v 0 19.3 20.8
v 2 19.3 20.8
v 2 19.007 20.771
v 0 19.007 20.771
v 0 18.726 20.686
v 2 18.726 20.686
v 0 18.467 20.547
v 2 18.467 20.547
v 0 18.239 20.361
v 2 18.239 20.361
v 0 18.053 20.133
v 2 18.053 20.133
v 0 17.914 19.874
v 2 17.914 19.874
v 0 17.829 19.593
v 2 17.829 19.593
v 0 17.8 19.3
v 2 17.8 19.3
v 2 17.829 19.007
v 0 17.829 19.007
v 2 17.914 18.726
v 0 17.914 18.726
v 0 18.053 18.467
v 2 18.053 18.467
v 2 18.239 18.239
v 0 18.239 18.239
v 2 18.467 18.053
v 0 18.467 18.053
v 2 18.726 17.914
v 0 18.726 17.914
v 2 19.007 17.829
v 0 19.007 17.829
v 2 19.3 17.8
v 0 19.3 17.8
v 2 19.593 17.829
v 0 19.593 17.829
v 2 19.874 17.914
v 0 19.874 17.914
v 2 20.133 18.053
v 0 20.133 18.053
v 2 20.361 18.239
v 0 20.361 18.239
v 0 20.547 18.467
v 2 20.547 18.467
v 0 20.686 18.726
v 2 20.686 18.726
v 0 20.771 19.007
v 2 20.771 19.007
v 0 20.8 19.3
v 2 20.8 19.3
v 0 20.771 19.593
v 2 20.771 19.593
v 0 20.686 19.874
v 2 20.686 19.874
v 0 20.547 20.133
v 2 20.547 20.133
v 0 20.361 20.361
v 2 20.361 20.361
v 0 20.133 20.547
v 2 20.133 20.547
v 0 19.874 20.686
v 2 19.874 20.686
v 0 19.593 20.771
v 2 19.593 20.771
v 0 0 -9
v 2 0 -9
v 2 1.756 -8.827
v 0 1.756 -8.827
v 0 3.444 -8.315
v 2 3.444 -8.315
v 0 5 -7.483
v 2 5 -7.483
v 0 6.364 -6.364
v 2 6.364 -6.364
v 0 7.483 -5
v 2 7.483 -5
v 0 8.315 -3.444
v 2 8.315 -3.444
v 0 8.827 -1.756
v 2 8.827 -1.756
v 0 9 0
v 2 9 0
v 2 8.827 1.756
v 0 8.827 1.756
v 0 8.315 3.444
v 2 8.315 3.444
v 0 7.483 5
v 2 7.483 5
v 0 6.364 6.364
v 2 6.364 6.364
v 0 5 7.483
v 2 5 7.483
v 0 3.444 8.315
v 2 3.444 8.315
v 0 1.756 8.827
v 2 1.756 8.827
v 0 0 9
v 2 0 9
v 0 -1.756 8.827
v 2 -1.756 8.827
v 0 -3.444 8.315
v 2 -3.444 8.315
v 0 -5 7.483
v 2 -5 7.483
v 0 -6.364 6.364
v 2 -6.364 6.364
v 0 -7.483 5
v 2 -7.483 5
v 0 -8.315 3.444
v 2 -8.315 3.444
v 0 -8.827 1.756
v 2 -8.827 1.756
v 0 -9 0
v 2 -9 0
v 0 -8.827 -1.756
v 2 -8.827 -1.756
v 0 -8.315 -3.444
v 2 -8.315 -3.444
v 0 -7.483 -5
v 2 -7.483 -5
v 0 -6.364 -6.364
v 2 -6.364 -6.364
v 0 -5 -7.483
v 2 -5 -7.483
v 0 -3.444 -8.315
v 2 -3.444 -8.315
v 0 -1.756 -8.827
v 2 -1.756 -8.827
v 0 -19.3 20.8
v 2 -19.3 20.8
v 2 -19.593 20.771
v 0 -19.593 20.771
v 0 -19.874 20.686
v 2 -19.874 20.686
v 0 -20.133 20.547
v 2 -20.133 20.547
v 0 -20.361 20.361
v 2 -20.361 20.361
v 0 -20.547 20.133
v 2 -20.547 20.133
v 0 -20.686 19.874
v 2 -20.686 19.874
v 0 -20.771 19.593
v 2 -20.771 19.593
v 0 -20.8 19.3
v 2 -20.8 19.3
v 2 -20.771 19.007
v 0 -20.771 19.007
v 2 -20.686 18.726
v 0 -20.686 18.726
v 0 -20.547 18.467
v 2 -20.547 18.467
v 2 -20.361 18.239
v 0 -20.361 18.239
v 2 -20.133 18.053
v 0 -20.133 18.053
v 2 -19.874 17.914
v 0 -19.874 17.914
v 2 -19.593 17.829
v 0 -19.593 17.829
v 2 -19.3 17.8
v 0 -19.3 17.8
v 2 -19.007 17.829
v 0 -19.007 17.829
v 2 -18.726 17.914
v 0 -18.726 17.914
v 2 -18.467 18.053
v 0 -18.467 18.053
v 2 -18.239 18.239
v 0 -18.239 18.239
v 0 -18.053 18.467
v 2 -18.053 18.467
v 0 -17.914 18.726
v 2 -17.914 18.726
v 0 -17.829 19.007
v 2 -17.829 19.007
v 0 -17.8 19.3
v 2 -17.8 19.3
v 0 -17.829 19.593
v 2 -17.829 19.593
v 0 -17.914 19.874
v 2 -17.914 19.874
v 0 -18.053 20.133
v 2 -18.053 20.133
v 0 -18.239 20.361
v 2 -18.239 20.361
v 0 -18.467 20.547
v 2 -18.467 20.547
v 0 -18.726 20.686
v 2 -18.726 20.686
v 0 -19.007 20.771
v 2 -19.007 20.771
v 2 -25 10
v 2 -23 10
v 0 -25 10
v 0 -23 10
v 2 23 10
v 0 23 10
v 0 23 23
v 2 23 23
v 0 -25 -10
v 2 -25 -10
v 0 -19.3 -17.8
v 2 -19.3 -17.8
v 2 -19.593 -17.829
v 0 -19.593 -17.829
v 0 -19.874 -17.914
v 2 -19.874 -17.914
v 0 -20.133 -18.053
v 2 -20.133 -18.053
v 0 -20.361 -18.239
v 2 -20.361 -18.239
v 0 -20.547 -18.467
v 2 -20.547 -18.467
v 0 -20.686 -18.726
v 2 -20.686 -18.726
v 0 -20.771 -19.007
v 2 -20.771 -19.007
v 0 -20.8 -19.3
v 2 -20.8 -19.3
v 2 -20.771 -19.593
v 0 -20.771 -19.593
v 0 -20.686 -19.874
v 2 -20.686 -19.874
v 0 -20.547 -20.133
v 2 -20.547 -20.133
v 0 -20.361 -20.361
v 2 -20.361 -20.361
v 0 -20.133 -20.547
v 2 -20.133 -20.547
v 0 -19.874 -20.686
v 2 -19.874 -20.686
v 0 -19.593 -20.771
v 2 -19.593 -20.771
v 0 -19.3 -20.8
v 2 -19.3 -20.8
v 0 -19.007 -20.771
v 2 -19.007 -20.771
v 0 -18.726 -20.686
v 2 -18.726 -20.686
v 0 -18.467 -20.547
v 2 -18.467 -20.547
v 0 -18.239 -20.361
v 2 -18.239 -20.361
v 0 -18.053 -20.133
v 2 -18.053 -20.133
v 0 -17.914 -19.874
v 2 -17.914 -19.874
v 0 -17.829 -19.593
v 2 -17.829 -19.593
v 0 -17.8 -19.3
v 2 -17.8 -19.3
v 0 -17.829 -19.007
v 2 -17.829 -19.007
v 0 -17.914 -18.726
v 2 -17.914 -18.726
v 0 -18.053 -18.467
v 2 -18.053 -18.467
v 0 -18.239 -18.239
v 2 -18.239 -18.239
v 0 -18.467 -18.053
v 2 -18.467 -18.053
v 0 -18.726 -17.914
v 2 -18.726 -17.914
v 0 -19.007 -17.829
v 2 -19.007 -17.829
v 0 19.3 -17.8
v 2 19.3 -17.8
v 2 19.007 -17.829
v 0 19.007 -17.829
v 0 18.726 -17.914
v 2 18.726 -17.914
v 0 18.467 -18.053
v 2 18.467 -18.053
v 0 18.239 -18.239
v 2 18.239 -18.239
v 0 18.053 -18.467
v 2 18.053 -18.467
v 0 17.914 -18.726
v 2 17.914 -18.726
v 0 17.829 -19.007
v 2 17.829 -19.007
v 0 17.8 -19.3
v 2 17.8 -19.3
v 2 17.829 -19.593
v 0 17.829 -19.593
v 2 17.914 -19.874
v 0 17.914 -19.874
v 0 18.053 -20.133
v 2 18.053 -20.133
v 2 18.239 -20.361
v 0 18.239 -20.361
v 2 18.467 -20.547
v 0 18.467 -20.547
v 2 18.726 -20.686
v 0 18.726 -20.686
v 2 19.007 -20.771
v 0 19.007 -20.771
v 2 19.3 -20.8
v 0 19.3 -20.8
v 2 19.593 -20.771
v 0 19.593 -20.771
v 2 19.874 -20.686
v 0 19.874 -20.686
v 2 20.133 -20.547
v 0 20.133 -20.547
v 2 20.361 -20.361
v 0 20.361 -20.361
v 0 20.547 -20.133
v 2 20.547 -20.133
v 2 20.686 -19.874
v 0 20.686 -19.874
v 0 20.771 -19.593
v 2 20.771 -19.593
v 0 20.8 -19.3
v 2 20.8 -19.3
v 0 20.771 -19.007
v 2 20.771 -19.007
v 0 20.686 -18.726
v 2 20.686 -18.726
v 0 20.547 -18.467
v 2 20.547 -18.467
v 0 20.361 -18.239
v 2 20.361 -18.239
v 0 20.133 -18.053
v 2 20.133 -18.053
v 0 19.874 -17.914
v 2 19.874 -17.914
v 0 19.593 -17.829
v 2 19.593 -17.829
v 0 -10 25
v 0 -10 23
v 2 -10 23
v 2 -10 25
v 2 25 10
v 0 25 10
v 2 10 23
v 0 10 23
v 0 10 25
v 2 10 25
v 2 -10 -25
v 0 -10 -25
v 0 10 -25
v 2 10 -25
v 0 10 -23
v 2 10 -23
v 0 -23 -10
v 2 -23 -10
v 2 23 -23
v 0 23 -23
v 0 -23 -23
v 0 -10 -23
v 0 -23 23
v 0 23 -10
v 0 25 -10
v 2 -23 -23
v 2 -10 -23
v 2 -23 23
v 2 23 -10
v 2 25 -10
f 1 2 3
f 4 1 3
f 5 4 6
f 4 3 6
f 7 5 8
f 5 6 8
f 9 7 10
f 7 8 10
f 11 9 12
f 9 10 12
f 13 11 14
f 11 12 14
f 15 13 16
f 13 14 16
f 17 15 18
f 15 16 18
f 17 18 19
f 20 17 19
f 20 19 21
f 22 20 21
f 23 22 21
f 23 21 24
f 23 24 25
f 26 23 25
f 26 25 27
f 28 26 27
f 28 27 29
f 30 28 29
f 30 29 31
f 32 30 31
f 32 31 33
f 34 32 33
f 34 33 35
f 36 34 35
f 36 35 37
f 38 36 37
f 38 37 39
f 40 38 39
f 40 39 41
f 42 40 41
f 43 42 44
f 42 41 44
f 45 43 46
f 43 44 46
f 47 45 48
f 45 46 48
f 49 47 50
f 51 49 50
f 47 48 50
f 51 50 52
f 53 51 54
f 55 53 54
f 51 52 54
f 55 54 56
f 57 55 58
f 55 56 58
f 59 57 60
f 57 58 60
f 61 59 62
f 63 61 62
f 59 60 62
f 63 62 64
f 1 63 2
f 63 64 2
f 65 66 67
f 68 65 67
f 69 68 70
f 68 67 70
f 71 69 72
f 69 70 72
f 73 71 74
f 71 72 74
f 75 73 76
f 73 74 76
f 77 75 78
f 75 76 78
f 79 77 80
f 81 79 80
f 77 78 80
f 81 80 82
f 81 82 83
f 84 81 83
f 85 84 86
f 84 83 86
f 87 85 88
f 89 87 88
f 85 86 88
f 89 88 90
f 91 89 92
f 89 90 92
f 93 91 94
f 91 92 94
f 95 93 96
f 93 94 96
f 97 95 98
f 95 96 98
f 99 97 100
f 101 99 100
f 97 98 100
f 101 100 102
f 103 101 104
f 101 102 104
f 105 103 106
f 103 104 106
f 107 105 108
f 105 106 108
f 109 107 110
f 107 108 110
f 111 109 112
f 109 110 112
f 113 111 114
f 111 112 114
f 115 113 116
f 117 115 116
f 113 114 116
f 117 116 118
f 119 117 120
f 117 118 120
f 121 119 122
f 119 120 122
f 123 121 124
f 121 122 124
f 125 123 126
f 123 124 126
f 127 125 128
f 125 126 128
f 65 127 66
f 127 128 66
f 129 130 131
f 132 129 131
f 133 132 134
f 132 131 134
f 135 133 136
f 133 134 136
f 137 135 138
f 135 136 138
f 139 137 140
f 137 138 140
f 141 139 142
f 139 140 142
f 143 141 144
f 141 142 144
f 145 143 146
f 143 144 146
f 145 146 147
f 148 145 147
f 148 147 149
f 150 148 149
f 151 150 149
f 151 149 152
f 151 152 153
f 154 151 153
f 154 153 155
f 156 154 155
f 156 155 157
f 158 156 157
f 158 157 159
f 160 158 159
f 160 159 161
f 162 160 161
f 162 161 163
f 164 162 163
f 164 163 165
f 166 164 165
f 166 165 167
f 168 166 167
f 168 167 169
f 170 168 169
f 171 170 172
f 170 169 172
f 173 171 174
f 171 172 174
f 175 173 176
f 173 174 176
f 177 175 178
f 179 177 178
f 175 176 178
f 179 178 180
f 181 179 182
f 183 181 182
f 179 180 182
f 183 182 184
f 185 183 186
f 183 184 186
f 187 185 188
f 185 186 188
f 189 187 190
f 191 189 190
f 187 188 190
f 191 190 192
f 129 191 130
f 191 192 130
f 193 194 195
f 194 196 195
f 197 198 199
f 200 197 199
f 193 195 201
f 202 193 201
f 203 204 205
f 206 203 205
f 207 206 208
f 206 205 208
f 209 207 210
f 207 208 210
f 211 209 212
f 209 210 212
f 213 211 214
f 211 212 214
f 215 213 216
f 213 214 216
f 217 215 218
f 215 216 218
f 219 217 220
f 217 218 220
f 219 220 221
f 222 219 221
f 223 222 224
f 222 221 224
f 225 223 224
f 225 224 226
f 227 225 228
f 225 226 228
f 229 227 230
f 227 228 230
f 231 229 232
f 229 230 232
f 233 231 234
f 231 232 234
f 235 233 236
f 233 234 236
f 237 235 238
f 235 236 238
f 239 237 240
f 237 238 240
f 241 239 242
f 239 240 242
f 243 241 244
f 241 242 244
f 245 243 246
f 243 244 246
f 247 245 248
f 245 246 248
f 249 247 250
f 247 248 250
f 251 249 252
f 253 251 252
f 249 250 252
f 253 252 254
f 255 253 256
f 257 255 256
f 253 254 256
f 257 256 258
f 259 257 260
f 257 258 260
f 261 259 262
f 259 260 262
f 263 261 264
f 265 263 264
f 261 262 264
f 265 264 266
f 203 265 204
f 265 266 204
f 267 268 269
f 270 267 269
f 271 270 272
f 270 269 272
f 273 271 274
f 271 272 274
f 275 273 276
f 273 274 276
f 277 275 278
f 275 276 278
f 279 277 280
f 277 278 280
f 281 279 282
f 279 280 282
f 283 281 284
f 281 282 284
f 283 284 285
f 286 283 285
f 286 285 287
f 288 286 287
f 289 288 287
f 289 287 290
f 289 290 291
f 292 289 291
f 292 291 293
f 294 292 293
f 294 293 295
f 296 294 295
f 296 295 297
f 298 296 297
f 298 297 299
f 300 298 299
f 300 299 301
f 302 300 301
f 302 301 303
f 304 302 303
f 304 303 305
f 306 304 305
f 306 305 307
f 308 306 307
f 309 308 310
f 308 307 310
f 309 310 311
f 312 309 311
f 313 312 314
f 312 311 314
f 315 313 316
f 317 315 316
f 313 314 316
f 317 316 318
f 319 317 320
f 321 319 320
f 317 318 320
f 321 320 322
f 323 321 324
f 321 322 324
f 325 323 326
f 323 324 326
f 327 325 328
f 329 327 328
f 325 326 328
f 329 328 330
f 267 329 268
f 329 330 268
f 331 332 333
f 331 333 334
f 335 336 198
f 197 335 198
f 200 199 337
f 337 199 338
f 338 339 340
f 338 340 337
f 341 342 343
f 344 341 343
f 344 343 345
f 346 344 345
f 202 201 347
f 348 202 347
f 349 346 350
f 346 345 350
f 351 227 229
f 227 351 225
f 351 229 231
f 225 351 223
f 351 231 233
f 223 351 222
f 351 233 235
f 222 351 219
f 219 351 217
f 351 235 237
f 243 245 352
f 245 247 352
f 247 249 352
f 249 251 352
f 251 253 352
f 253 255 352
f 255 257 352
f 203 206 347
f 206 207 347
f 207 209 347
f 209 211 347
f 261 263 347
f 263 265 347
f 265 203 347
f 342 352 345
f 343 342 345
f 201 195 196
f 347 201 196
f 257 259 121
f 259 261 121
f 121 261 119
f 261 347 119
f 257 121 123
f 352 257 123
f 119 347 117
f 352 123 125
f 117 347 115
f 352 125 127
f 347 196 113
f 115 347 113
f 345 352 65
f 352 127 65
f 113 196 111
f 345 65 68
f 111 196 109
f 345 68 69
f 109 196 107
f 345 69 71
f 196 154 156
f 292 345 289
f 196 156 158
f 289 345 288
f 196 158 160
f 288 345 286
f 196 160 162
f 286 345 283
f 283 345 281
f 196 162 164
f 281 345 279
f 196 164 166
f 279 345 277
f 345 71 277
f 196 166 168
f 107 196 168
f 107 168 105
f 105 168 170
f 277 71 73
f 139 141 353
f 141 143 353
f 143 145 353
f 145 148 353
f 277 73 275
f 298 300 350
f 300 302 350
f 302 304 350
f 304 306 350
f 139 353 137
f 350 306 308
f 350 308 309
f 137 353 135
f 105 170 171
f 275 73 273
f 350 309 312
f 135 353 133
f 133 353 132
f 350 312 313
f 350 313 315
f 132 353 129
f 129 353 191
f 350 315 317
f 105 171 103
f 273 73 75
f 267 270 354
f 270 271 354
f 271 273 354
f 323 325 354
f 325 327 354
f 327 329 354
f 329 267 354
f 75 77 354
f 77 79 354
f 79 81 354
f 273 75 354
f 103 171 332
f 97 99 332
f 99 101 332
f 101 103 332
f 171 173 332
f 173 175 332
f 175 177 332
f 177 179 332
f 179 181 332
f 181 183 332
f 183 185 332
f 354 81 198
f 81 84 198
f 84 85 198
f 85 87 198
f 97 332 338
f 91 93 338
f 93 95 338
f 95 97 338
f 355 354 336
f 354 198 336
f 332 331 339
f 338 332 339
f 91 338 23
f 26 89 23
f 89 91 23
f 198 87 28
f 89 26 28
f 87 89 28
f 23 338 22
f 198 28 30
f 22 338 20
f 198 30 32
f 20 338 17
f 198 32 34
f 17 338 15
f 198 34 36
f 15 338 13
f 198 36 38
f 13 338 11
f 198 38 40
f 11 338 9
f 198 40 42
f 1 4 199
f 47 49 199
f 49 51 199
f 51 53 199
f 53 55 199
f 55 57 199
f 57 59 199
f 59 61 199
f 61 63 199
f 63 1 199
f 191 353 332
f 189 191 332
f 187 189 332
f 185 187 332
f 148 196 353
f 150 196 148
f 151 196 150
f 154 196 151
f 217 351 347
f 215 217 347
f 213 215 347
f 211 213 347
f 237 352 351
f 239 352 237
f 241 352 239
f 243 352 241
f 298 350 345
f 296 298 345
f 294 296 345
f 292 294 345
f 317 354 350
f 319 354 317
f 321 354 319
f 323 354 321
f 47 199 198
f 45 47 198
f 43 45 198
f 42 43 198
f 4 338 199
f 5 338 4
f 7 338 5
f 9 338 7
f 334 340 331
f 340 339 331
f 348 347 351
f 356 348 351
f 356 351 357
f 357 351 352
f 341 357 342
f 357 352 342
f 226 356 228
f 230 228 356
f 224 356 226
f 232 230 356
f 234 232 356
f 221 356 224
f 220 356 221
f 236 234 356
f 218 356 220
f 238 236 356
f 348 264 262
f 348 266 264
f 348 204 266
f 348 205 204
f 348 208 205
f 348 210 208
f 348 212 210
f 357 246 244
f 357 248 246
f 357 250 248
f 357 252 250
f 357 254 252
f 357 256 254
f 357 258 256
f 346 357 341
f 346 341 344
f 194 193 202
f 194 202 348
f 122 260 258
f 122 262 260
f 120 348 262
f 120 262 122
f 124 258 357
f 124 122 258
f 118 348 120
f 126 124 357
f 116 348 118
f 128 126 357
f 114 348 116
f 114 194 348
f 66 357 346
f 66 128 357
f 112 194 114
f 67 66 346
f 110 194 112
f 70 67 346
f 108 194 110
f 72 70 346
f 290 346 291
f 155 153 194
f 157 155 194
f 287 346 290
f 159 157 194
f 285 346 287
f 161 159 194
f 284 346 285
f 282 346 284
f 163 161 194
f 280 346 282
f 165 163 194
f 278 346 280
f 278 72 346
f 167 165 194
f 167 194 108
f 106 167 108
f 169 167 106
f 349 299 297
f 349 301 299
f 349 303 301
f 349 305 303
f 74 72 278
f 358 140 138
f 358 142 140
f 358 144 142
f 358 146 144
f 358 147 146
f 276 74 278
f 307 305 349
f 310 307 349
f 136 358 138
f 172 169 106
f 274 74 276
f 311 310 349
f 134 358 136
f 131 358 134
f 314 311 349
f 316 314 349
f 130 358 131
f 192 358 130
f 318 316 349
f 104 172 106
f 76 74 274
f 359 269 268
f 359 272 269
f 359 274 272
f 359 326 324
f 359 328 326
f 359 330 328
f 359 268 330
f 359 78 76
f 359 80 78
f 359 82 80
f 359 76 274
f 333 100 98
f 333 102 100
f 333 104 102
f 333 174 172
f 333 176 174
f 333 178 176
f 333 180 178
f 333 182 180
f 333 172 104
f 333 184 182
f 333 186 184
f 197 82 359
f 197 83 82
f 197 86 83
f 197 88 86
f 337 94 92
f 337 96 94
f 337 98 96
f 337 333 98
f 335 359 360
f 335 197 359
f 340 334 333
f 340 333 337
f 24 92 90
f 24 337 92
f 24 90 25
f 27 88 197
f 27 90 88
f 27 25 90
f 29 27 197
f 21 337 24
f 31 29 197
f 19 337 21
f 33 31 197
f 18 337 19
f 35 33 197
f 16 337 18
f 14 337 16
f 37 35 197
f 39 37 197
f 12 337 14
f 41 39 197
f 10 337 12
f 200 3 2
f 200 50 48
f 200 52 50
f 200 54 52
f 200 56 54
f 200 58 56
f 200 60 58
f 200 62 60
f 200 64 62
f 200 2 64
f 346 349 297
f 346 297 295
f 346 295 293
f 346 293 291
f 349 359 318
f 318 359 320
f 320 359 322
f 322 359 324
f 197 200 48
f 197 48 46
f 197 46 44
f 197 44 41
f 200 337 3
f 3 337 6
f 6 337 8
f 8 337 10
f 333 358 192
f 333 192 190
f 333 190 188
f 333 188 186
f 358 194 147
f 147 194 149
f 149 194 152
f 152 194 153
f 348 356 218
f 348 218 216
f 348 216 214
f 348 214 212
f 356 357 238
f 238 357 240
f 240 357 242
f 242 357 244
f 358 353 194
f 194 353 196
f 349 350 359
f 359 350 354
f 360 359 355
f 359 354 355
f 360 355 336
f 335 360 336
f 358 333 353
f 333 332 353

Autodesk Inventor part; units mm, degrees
ref_plane "YZ Plane" through (0, 0, 0) normal (1, 0, 0) x (0, 1, 0)
ref_plane "XZ Plane" through (0, 0, 0) normal (0, 1, 0) x (-1, 0, 0)
ref_plane "XY Plane" through (0, 0, 0) normal (0, 0, 1) x (1, 0, 0)
sketch "Sketch1" plane through (0, 0, 0) normal (1, 0, 0) x (0, 1, 0)
  line L0 (-25, -25) -> (25, -25)
  line L1 (25, -25) -> (25, 25)
  line L2 (25, 25) -> (-25, 25)
  line L3 (-25, 25) -> (-25, -25)
  line L4 (-25, -25) -> (25, 25) construction
  line L5 (25, -25) -> (-25, 25) construction
  line L6 (-24, -24) -> (24, -24)
  line L7 (24, -24) -> (24, 24)
  line L8 (24, 24) -> (-24, 24)
  line L9 (-24, 24) -> (-24, -24)
  line L10 (-24, -24) -> (24, 24) construction
  line L11 (24, -24) -> (-24, 24) construction
  point P0 (0, 0)
  dimension "d0" = 50
  dimension "d1" = 50
  dimension "d2" = 48
  dimension "d3" = 48
extrude "Extrusion1" add sketch "Sketch1" along normal blind 2 contours L3 L2 L1 L0 | L9 L8 L7 L6
sketch "Sketch3" plane through (0, 0, 0) normal (-1, 0, 0) x (0, 0, 1)
  line L0 (19.3, -19.3) -> (-19.3, -19.3)
  line L1 (-19.3, -19.3) -> (-19.3, 19.3)
  line L2 (-19.3, 19.3) -> (19.3, 19.3)
  line L3 (19.3, 19.3) -> (19.3, -19.3)
  line L4 (19.3, -19.3) -> (-19.3, 19.3) construction
  line L5 (-19.3, -19.3) -> (19.3, 19.3) construction
  circle A0 centre (-19.3, 19.3) radius 1.5
  circle A1 centre (19.3, 19.3) radius 1.5555
  circle A2 centre (19.3, -19.3) radius 1.5555
  circle A3 centre (-19.3, -19.3) radius 1.5555
  point P0 (0, 0)
  dimension "d6" = 38.6
  dimension "d7" = 38.6
  dimension "d8" = 3
  dimension "d9" = 3.111
  dimension "d10" = 3.111
  dimension "d11" = 3.111
hole "Hole1" at (0, 19.3, -19.3) direction (1, 0, 0) diameter 3 end through all
sketch "Sketch4" plane through (0, 0, 0) normal (-1, 0, 0) x (0, 0, 1)
  line L0 (-19.3, -19.3) -> (19.3, -19.3)
  line L1 (19.3, -19.3) -> (19.3, 19.3)
  line L2 (19.3, 19.3) -> (-19.3, 19.3)
  line L3 (-19.3, 19.3) -> (-19.3, -19.3)
  line L4 (-19.3, -19.3) -> (19.3, 19.3) construction
  line L5 (19.3, -19.3) -> (-19.3, 19.3) construction
  circle A0 centre (19.3, 19.3) radius 1.5
  point P0 (0, 0)
  dimension "d19" = 38.6
  dimension "d20" = 38.6
  dimension "d21" = 3
hole "Hole2" at (0, 19.3, 19.3) direction (1, 0, 0) diameter 3 end through all
sketch "Sketch5" plane through (0, 0, 0) normal (-1, 0, 0) x (0, 0, 1)
  line L0 (19.3, -19.3) -> (-19.3, -19.3)
  line L1 (-19.3, -19.3) -> (-19.3, 19.3)
  line L2 (-19.3, 19.3) -> (19.3, 19.3)
  line L3 (19.3, 19.3) -> (19.3, -19.3)
  line L4 (19.3, -19.3) -> (-19.3, 19.3) construction
  line L5 (-19.3, -19.3) -> (19.3, 19.3) construction
  circle A0 centre (-19.3, -19.3) radius 1.5
  point P0 (0, 0)
  dimension "d29" = 38.6
  dimension "d30" = 38.6
  dimension "d31" = 3
hole "Hole3" at (0, -19.3, -19.3) direction (1, 0, 0) diameter 3 end through all
sketch "Sketch6" plane through (0, 0, 0) normal (-1, 0, 0) x (0, 0, 1)
  line L0 (19.3, -19.3) -> (-19.3, -19.3)
  line L1 (-19.3, -19.3) -> (-19.3, 19.3)
  line L2 (-19.3, 19.3) -> (19.3, 19.3)
  line L3 (19.3, 19.3) -> (19.3, -19.3)
  line L4 (19.3, -19.3) -> (-19.3, 19.3) construction
  line L5 (-19.3, -19.3) -> (19.3, 19.3) construction
  circle A0 centre (19.3, -19.3) radius 1.5
  point P0 (0, 0)
  dimension "d39" = 38.6
  dimension "d40" = 38.6
  dimension "d41" = 3
hole "Hole4" at (0, -19.3, 19.3) direction (1, 0, 0) diameter 3 end through all
sketch "Sketch7" plane through (0, 0, 0) normal (-1, 0, 0) x (0, 0, 1)
  line L0 (23, -23) -> (-23, -23)
  line L1 (-23, -23) -> (-23, 23)
  line L2 (-23, 23) -> (23, 23)
  line L3 (23, 23) -> (23, -23)
  line L4 (23, -23) -> (-23, 23) construction
  line L5 (-23, -23) -> (23, 23) construction
  line L6 (-25, 25) -> (25, 25) projected
  line L7 (10, 21) -> (-10, 21)
  line L8 (-10, 21) -> (-10, 25)
  line L9 (-10, 25) -> (10, 25)
  line L10 (10, 25) -> (10, 21)
  line L11 (10, 21) -> (-10, 25) construction
  line L12 (-10, 21) -> (10, 25) construction
  line L13 (21, -10) -> (25, -10)
  line L14 (25, -10) -> (25, 10)
  line L15 (25, 10) -> (21, 10)
  line L16 (21, 10) -> (21, -10)
  line L17 (21, -10) -> (25, 10) construction
  line L18 (25, -10) -> (21, 10) construction
  line L19 (25, -25) -> (-25, -25) projected
  line L20 (-10, -21) -> (10, -21)
  line L21 (10, -21) -> (10, -25)
  line L22 (10, -25) -> (-10, -25)
  line L23 (-10, -25) -> (-10, -21)
  line L24 (-10, -21) -> (10, -25) construction
  line L25 (10, -21) -> (-10, -25) construction
  line L26 (-25.0252, 10) -> (-20.9748, 10)
  line L27 (-20.9748, 10) -> (-20.9748, -10)
  line L28 (-20.9748, -10) -> (-25.0252, -10)
  line L29 (-25.0252, -10) -> (-25.0252, 10)
  line L30 (-25.0252, 10) -> (-20.9748, -10) construction
  line L31 (-20.9748, 10) -> (-25.0252, -10) construction
  line L32 (25, -25) -> (-25, -25)
  line L33 (-25, -25) -> (-25, 25)
  line L34 (-25, 25) -> (25, 25)
  line L35 (25, 25) -> (25, -25)
  line L36 (25, -25) -> (-25, 25) construction
  line L37 (-25, -25) -> (25, 25) construction
  point P0 (0, 0)
  point P1 (0, 23)
  point P2 (23, 0)
  point P3 (0, -23)
  point P4 (-23, 0)
  point P5 (-10, 23)
  point P6 (10, 23)
  point P7 (23, 10)
  point P8 (23, -10)
  point P9 (10, -23)
  point P10 (-10, -23)
  point P11 (-23, -10)
  point P12 (-23, 10)
  point P13 (10, 25)
  point P14 (-25, 10)
  point P15 (-25, -10)
  point P16 (-10, -25)
  dimension "d49" = 46
  dimension "d50" = 46
  dimension "d51" = 20
  dimension "d52" = 20
  dimension "d53" = 20
  dimension "d54" = 20
extrude "Extrusion3" cut sketch "Sketch7" against normal blind 2 contours L3 L13 L35 L19 L21 L0 | L23 L19 L33 L28 L1 L0 | L3 L2 L10 L6 L35 L15 | L26 L33 L6 L8 L2 L1
sketch "Sketch8" plane through (2, 0, 0) normal (1, 0, 0) x (0, 0, -1)
  circle A0 centre (0, 0) radius 9
  dimension "d59" = 18
extrude "Extrusion4" cut sketch "Sketch8" against normal blind 2
sketch "Sketch9" plane through (2, 0, 0) normal (1, 0, 0) x (0, 0, -1)
  line L0 (13.75, -13.75) -> (-13.75, -13.75)
  line L1 (-13.75, -13.75) -> (-13.75, 13.75)
  line L2 (-13.75, 13.75) -> (13.75, 13.75)
  line L3 (13.75, 13.75) -> (13.75, -13.75)
  line L4 (13.75, -13.75) -> (-13.75, 13.75) construction
  line L5 (-13.75, -13.75) -> (13.75, 13.75) construction
  circle A0 centre (-13.75, 13.75) radius 1
  circle A1 centre (13.75, 13.75) radius 1
  circle A2 centre (13.75, -13.75) radius 1
  circle A3 centre (-13.75, -13.75) radius 1
  point P0 (0, 0)
  dimension "d62" = 27.5
  dimension "d63" = 27.5
  dimension "d64" = 2
  dimension "d65" = 2
  dimension "d66" = 2
  dimension "d67" = 2
extrude "Extrusion5" [suppressed]
properties part number "UpperSide" material "Aluminum 6061, Welded"
